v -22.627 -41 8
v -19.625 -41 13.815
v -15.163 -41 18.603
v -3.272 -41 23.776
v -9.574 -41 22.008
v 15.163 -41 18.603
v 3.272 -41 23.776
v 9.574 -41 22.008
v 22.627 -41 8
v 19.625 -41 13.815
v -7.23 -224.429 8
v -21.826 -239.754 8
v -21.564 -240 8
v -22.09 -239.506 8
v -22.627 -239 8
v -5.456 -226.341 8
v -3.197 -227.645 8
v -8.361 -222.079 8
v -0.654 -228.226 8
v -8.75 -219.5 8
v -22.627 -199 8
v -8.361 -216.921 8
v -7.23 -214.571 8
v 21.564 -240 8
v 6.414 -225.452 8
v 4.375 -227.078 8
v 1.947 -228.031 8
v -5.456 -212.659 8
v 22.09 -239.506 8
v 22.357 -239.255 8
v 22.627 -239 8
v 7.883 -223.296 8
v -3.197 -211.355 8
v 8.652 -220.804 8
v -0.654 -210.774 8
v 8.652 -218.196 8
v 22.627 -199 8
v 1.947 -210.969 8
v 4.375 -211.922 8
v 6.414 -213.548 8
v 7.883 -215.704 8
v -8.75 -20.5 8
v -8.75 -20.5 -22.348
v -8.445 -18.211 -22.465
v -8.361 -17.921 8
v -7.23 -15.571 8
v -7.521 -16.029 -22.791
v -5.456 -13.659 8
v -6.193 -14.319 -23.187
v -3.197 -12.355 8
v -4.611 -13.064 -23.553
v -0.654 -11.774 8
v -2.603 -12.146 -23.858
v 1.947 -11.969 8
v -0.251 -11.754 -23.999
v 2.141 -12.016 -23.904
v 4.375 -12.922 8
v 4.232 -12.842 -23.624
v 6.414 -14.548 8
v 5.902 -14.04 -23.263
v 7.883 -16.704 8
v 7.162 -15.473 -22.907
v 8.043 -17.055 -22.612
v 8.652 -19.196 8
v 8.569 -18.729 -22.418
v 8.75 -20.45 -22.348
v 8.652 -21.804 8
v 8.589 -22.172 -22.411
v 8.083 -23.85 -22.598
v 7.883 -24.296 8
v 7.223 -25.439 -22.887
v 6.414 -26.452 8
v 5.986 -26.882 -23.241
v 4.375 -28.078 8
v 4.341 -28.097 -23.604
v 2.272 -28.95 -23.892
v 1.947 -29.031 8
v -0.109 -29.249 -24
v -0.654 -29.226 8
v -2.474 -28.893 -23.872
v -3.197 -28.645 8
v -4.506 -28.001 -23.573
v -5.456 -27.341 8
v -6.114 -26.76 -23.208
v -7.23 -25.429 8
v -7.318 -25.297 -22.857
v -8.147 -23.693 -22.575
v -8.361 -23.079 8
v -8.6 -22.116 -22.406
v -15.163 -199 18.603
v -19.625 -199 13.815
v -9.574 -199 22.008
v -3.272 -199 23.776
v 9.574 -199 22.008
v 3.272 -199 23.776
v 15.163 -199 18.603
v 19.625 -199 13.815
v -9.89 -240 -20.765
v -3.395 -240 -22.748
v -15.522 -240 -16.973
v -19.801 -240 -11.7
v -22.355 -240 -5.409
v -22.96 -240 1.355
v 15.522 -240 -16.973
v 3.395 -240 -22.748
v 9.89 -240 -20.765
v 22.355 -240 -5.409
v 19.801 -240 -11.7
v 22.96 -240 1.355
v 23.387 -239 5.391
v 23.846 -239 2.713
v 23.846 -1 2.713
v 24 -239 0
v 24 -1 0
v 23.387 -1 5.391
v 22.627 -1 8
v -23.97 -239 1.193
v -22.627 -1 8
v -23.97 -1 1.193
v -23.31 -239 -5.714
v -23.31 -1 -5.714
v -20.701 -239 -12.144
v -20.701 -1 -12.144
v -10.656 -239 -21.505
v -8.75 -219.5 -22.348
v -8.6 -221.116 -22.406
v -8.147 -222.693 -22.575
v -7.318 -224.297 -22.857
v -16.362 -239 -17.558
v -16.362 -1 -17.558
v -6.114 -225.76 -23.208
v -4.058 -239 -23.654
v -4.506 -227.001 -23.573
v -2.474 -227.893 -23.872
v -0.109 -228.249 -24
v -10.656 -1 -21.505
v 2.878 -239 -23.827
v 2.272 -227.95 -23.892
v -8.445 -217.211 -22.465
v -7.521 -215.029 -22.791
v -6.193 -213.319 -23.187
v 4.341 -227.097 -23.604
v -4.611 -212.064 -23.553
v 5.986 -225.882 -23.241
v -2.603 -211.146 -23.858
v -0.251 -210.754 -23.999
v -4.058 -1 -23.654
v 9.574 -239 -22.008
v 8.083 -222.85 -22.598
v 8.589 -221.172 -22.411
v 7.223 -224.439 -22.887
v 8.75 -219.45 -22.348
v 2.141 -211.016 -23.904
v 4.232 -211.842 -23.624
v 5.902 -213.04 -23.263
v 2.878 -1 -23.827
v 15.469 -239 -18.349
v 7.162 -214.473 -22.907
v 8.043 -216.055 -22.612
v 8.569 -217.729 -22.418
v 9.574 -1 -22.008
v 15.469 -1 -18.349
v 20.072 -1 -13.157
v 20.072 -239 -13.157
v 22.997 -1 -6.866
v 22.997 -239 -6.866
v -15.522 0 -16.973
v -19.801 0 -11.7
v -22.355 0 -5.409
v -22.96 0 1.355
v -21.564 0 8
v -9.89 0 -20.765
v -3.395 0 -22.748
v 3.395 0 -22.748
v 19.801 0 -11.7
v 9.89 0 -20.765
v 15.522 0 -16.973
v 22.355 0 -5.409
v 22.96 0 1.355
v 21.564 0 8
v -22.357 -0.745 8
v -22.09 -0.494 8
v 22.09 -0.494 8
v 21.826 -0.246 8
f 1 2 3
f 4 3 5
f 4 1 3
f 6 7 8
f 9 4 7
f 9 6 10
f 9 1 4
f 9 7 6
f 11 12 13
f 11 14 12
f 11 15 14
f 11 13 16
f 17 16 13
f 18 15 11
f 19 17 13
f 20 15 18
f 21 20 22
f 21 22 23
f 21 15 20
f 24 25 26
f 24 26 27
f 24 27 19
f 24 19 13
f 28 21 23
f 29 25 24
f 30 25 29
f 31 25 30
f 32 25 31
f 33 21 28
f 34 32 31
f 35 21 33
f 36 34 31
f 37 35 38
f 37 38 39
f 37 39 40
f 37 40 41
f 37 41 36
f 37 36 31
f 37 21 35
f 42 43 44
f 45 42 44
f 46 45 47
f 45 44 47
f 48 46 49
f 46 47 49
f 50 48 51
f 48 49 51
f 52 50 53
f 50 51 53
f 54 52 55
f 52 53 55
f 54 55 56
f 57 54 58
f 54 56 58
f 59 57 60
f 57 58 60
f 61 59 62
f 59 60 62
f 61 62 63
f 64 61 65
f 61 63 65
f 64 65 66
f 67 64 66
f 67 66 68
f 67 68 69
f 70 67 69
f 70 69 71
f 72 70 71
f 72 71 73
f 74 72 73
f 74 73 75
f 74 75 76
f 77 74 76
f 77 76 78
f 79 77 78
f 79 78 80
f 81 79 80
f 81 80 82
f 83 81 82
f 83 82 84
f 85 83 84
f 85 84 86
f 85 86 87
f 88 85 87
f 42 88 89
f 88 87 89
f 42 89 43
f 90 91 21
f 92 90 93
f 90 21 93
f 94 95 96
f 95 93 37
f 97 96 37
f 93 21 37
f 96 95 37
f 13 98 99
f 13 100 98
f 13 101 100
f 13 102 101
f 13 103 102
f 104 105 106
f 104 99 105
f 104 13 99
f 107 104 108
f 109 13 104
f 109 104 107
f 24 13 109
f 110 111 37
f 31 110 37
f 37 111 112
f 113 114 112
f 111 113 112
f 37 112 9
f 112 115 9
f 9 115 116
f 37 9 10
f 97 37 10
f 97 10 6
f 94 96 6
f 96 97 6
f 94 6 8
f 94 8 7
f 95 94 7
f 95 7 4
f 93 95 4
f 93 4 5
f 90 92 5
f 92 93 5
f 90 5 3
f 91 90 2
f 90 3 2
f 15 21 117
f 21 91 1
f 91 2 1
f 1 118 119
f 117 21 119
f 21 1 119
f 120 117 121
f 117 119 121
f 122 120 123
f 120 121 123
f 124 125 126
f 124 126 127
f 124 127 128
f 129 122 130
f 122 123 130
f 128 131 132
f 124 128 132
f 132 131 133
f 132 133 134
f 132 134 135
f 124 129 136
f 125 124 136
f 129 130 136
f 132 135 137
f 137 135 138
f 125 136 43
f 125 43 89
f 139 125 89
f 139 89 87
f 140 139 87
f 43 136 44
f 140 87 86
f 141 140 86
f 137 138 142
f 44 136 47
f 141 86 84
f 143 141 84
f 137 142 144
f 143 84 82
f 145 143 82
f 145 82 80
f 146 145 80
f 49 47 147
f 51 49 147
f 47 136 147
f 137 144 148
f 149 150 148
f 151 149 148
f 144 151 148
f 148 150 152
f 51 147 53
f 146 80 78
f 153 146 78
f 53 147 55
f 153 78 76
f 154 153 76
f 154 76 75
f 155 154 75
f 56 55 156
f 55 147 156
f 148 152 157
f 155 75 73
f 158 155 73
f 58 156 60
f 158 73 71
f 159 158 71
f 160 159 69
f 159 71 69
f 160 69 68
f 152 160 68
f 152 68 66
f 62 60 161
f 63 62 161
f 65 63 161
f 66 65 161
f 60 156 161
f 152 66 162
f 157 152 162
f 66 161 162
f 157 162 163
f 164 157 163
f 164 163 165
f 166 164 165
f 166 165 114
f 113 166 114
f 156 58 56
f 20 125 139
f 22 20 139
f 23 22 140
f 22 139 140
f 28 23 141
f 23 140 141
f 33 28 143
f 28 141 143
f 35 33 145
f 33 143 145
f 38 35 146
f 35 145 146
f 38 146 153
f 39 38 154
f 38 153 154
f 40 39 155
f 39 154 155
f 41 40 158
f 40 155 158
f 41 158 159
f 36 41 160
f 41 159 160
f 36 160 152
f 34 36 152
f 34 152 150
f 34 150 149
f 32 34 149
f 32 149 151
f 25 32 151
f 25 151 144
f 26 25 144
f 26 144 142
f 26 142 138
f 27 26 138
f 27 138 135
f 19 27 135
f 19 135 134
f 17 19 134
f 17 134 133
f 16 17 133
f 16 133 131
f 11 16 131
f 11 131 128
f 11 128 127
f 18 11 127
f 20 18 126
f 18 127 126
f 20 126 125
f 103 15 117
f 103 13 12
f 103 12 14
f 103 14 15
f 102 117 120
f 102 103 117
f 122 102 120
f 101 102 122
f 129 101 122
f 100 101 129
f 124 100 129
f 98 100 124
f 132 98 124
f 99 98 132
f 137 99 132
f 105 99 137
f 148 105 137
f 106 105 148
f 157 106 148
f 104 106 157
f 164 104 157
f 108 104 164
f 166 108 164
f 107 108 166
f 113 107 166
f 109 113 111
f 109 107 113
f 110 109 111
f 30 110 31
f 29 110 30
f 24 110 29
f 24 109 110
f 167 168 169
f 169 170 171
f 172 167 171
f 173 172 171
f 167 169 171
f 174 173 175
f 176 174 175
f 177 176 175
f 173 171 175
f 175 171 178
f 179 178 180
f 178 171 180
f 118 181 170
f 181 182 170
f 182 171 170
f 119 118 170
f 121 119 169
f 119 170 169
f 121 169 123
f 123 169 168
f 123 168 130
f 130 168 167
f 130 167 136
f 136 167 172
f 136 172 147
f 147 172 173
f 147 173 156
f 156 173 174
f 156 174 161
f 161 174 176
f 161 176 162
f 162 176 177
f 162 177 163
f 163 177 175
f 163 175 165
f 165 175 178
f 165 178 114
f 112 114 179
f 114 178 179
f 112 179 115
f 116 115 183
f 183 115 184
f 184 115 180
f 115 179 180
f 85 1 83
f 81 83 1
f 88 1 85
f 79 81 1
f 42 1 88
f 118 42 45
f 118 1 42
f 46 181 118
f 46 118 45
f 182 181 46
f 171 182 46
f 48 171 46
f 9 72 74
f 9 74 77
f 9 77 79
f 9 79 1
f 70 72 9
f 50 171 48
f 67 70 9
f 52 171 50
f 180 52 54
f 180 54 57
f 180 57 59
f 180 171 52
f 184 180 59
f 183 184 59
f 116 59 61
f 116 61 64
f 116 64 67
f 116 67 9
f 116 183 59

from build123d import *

# Parameters (mm, degrees)
F0_R     = 24
F1_DEPTH = 240
F2_SIZE  = 1
F5_W     = 50
F5_H     = 41
F6_DEPTH = 125
F8_D     = 17.5


with BuildPart() as f1:
    # F0 (on Front) → F1 (new body)
    with BuildSketch(Plane.XZ):
        Circle(F0_R)
    extrude(amount=F1_DEPTH)

    # F2
    f2_edges = [f1.edges().sort_by_distance(p)[0] for p in [
        (24, -120, 0),
        (-24, 0, 0),
        (-24, -240, 0),
    ]]
    chamfer(f2_edges, length=F2_SIZE)

    # F5 (on offset) → F6 (cut)
    with BuildSketch(Plane.XY.offset(8)):
        with Locations((0, -20.5)):
            Rectangle(F5_W, F5_H)
        with Locations((0, -219.5)):
            Rectangle(F5_W, F5_H)
    extrude(amount=F6_DEPTH, mode=Mode.SUBTRACT)

    # F8 (through all)
    with Locations(Plane.XY.offset(8)):
        with Locations((0, -20.5), (0, -219.5)):
            Hole(F8_D / 2)


solid = f1.part
